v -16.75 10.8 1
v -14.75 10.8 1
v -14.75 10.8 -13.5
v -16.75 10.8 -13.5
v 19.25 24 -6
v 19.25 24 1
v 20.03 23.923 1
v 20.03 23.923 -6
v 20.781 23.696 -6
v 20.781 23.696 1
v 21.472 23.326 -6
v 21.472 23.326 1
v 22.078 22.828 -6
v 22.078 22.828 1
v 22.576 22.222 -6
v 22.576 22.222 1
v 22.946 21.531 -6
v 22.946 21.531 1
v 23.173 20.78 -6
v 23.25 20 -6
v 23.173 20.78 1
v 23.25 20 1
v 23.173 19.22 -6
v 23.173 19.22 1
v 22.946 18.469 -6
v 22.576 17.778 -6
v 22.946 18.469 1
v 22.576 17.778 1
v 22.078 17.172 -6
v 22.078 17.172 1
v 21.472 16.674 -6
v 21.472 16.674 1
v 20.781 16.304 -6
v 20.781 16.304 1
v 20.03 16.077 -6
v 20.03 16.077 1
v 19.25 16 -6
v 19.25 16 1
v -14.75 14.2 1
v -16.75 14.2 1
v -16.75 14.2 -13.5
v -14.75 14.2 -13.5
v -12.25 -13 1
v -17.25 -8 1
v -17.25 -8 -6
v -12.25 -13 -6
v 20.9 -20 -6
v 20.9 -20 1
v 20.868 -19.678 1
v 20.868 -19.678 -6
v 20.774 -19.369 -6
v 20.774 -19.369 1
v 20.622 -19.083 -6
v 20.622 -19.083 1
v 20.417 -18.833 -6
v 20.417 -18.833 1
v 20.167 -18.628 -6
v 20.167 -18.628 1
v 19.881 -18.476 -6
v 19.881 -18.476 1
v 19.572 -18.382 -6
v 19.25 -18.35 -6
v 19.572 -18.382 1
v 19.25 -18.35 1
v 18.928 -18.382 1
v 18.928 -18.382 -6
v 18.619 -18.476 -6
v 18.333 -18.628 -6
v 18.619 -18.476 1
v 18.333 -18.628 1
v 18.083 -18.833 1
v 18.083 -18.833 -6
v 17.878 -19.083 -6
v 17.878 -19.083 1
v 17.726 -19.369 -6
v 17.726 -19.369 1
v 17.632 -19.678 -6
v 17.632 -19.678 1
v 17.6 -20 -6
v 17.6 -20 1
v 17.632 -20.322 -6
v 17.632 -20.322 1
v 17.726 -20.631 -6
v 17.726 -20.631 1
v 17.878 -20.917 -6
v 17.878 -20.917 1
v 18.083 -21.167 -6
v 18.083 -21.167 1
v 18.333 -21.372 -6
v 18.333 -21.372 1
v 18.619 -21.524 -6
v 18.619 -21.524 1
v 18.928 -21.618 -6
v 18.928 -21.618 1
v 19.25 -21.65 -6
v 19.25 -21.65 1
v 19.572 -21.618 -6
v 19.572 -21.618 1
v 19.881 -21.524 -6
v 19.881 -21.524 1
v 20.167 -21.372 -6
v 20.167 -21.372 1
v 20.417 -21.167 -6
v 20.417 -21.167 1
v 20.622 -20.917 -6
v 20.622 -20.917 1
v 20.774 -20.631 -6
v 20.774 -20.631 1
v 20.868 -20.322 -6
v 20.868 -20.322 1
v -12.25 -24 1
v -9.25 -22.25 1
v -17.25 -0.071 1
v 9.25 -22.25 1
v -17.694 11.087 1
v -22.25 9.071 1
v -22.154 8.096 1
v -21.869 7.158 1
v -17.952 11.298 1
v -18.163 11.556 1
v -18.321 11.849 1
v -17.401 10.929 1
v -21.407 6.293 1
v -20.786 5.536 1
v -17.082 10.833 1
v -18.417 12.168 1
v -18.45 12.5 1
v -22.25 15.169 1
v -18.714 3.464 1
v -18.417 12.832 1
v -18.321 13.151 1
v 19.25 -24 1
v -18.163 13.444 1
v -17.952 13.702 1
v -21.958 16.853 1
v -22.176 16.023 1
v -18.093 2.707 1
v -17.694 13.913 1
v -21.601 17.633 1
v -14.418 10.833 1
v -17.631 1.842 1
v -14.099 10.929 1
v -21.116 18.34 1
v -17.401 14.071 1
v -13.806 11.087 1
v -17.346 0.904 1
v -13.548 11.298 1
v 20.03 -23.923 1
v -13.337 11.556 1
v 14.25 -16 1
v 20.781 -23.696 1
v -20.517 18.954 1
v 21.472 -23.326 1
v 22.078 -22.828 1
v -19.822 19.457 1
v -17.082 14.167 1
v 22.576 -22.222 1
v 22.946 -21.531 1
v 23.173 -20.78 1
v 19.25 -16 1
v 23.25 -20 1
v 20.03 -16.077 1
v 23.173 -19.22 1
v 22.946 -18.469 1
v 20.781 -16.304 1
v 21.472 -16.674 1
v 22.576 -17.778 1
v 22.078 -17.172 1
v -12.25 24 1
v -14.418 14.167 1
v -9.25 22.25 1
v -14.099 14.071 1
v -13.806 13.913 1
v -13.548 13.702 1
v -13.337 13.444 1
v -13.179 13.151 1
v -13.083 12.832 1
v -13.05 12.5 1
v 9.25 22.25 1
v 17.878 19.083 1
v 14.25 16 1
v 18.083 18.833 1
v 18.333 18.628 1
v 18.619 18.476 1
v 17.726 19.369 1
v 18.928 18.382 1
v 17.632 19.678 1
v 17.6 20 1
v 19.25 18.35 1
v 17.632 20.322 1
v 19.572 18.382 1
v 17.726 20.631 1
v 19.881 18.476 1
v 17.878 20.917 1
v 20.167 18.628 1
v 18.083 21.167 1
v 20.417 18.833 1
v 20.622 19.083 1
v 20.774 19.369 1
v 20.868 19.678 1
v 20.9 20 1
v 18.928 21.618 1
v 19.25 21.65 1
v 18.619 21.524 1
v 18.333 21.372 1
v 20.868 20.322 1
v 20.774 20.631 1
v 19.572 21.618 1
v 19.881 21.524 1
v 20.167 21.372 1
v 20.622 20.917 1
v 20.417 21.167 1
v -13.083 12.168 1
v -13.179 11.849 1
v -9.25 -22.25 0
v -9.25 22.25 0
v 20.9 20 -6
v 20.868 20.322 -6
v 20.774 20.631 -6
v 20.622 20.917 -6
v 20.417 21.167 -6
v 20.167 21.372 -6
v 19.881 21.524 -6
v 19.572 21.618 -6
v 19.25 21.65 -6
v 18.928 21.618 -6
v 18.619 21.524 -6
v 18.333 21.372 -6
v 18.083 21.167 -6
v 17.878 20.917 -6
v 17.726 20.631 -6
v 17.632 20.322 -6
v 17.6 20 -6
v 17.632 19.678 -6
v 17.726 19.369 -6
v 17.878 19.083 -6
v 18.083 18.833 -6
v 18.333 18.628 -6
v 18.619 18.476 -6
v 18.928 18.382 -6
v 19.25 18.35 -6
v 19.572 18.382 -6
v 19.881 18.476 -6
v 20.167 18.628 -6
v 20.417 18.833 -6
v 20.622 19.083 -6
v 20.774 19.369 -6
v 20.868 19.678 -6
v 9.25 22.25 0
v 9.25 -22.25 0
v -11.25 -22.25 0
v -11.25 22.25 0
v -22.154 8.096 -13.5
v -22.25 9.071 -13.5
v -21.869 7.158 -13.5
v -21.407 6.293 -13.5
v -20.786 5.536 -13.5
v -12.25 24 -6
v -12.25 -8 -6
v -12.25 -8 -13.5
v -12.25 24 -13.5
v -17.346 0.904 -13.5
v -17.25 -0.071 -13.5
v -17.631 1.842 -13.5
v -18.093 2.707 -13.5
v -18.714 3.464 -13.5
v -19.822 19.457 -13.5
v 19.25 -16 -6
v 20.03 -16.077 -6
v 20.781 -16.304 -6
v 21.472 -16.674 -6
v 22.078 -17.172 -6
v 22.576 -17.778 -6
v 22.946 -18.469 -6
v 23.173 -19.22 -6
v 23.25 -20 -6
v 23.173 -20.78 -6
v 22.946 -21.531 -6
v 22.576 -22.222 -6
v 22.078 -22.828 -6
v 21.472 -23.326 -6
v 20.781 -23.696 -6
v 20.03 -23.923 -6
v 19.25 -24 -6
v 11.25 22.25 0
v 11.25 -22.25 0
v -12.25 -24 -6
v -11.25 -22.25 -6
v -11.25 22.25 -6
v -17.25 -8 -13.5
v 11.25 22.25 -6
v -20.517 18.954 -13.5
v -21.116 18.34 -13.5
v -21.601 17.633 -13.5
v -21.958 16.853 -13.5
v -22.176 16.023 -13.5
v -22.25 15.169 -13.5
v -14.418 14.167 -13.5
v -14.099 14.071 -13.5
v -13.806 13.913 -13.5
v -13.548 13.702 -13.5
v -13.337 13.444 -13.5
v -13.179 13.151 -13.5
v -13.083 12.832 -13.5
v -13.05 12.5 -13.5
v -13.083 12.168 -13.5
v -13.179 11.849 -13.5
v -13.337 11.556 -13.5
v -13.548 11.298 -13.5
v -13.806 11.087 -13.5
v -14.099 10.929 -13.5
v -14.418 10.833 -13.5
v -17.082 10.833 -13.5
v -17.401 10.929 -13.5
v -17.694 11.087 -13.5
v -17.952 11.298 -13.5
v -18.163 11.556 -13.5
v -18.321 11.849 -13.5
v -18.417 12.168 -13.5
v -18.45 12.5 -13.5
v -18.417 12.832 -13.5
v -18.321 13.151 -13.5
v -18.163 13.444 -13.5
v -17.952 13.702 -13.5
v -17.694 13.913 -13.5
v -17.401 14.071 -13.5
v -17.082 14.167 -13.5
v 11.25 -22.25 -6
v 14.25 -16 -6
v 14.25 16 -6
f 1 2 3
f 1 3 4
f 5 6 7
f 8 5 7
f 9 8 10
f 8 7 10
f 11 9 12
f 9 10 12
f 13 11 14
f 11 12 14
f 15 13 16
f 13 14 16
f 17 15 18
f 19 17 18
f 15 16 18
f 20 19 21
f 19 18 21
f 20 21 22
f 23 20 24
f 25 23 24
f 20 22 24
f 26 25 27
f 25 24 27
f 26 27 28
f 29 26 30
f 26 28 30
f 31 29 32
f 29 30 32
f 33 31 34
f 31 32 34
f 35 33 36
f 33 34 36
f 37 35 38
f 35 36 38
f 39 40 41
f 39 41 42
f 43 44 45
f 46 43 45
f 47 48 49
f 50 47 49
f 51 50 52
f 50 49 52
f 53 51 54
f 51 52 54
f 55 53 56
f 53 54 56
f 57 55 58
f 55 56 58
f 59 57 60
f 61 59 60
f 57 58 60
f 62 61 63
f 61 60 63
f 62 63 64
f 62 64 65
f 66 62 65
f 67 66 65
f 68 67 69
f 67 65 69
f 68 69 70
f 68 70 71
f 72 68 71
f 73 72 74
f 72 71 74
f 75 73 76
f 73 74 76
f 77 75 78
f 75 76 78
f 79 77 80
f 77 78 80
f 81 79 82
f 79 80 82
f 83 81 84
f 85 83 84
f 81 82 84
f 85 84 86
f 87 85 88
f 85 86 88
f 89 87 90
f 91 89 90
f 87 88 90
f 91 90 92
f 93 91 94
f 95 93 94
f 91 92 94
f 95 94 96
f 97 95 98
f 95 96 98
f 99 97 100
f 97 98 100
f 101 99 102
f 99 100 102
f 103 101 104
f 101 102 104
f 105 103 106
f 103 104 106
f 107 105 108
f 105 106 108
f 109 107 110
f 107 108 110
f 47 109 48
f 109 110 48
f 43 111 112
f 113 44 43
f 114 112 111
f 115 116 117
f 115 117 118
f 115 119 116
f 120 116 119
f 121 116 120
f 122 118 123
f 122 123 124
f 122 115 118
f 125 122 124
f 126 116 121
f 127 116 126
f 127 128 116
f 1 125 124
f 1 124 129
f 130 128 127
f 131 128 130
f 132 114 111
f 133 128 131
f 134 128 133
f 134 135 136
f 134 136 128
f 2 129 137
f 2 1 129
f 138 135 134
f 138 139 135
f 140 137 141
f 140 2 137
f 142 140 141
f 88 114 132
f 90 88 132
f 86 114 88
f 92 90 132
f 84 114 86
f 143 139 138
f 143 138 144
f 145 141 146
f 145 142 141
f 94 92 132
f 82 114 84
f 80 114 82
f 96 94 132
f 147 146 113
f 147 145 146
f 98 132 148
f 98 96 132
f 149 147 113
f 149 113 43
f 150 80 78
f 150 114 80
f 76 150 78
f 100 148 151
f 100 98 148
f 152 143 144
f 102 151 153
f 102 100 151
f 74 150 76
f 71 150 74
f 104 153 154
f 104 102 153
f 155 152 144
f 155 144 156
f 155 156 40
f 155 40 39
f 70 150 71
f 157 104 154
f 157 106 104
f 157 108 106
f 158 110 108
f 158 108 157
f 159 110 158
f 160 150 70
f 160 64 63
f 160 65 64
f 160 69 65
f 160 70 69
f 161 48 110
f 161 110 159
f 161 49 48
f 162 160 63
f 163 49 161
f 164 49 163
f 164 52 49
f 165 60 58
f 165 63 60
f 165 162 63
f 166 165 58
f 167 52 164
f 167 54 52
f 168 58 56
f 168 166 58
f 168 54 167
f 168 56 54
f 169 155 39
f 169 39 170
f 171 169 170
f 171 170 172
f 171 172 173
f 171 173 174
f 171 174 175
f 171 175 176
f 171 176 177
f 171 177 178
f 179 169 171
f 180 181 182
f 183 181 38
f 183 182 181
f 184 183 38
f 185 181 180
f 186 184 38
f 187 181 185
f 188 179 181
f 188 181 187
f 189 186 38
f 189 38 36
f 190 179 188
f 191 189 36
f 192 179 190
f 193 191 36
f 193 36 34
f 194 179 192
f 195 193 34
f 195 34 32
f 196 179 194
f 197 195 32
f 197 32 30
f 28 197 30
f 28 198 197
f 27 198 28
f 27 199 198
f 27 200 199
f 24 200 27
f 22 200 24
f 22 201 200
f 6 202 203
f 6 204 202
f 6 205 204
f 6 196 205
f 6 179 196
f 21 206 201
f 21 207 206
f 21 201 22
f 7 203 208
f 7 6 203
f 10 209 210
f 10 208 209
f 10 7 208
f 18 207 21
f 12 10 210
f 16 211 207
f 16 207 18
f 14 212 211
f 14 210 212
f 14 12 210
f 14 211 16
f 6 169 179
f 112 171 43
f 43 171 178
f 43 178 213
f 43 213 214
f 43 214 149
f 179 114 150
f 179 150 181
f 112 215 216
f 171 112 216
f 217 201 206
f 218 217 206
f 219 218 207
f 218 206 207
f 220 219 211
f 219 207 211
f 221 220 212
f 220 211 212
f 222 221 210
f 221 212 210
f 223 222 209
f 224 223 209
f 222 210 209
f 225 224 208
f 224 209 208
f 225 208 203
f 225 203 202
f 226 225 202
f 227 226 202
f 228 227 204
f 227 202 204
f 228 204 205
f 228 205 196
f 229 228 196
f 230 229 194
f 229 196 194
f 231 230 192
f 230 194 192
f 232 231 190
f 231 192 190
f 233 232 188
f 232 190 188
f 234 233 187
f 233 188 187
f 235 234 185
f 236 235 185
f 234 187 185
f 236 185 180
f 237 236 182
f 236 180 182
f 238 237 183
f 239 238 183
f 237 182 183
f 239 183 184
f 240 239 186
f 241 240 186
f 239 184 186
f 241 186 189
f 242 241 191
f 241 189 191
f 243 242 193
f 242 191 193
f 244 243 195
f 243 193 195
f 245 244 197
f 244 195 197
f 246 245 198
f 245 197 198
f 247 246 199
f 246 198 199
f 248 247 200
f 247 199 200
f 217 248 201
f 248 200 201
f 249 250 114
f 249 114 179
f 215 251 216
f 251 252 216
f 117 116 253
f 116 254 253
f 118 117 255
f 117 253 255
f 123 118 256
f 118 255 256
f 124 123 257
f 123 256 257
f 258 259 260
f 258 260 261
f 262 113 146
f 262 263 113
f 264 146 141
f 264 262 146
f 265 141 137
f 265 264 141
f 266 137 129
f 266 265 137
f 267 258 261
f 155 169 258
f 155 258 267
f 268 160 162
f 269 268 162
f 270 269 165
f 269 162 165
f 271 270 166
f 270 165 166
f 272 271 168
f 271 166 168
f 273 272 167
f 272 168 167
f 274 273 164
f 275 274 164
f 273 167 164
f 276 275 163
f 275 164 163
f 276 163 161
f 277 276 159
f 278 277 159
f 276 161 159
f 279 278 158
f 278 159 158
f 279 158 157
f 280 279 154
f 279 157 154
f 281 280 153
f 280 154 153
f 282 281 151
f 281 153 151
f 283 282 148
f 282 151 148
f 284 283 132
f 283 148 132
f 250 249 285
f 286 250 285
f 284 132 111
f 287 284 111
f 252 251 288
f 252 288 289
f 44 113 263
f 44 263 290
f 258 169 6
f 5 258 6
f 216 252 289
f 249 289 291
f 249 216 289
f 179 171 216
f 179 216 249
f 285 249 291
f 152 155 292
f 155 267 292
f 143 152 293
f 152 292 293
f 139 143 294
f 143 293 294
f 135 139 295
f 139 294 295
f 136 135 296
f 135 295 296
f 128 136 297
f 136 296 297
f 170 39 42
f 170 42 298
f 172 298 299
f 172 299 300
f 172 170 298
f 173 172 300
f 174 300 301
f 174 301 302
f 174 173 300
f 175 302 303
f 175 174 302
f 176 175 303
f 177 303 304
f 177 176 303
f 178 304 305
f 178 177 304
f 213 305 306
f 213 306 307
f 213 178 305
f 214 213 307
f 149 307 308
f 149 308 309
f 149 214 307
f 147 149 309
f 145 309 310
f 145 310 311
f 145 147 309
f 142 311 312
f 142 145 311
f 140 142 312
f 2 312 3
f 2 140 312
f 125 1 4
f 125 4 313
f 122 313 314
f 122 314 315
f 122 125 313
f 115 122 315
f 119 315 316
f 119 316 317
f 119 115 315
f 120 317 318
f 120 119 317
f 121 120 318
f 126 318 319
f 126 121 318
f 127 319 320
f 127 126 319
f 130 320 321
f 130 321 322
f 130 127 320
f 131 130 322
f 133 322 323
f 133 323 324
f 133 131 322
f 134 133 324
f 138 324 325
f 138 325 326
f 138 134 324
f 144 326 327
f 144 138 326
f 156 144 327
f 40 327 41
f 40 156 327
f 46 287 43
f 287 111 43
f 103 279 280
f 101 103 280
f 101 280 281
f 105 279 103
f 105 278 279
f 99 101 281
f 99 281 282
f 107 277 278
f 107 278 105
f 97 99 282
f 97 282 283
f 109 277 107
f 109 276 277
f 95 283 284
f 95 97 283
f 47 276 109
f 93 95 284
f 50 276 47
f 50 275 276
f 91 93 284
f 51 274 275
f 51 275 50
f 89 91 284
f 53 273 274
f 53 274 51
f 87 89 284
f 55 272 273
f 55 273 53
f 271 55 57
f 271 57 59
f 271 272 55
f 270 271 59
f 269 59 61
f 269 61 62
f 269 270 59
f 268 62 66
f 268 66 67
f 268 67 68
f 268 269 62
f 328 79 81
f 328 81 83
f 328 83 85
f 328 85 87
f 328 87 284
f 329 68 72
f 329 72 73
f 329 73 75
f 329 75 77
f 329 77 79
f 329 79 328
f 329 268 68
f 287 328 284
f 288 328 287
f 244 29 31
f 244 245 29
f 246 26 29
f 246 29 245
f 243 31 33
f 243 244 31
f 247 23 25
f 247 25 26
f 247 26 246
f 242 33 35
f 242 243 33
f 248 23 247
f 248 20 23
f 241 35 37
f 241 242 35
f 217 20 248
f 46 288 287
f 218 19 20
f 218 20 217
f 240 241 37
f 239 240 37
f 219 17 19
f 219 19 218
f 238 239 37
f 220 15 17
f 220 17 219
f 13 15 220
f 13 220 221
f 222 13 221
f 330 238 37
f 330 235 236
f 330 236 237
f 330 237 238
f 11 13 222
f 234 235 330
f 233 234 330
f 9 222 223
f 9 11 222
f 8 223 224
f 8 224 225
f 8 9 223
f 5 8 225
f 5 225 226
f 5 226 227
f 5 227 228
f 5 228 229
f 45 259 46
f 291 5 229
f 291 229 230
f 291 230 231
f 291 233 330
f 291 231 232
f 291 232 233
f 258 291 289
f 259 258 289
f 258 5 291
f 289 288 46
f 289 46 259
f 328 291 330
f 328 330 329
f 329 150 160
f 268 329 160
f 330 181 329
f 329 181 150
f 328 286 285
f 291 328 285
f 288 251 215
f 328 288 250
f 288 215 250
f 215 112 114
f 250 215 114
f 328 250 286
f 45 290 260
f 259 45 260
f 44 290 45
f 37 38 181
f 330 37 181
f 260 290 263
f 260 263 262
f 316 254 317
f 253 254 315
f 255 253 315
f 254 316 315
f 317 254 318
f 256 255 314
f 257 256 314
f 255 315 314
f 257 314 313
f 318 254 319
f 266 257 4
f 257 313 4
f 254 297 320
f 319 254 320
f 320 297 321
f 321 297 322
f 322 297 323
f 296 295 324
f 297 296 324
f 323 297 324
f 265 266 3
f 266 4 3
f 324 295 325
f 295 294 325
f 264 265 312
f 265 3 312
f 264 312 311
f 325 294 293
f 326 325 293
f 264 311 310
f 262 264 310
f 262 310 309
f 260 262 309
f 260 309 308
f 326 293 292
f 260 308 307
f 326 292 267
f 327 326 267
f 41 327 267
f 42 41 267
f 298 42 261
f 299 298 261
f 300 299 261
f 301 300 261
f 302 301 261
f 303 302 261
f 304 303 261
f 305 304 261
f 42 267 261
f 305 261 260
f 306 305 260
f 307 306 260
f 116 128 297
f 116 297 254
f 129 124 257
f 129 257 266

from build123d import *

# Parameters (mm, degrees)
ESBO_O1_W                = 24.5
ESBO_O1_H                = 48
ESBO_O1_W_2              = 18.5
ESBO_O1_H_2              = 44.5
RESSALTO_EXTRUS_O1_DEPTH = 1
ESBO_O2_R                = 1.65
ESBO_O2_W                = 22.5
ESBO_O2_H                = 44.5
RESSALTO_EXTRUS_O2_DEPTH = 7
RESSALTO_EXTRUS_O3_DEPTH = 14.5
FILETE1_R                = 5
CHANFRO4_SIZE            = 5


with BuildPart() as part:
    # Esboço1 → Ressalto-extrusão1 (new body)
    with BuildSketch(Plane.XY):
        Rectangle(ESBO_O1_W, ESBO_O1_H)
        Rectangle(ESBO_O1_W_2, ESBO_O1_H_2, mode=Mode.SUBTRACT)
    extrude(amount=RESSALTO_EXTRUS_O1_DEPTH)

    # Esboço2 → Ressalto-extrusão2 (add)
    with BuildSketch(Plane.XY.offset(1)):
        with BuildLine():
            Line((19.25, 16), (14.25, 16))
            Line((14.25, 16), (14.25, -16))
            Line((14.25, -16), (19.25, -16))
            ThreePointArc((19.25, -16), (23.25, -20), (19.25, -24))
            Line((19.25, -24), (12.25, -24))
            Line((12.25, -24), (-12.25, -24))
            Line((-12.25, -24), (-12.25, 24))
            Line((-12.25, 24), (12.25, 24))
            Line((12.25, 24), (19.25, 24))
            ThreePointArc((19.25, 24), (23.25, 20), (19.25, 16))
        make_face()
        with Locations((19.25, 20)):
            Circle(ESBO_O2_R, mode=Mode.SUBTRACT)
        with Locations((19.25, -20)):
            Circle(ESBO_O2_R, mode=Mode.SUBTRACT)
        Rectangle(ESBO_O2_W, ESBO_O2_H, mode=Mode.SUBTRACT)
    extrude(amount=-RESSALTO_EXTRUS_O2_DEPTH)

    # Esboço4 → Ressalto-extrusão3 (add)
    with BuildSketch(Plane.XY.offset(1)):
        Polygon((-12.25, -8), (-12.25, 24), (-22.25, 18), (-22.25, 7), (-17.25, 2), (-17.25, -8), align=None)
        with BuildLine():
            ThreePointArc((-16.75, 10.8), (-18.45, 12.5), (-16.75, 14.2))
            Line((-16.75, 14.2), (-14.75, 14.2))
            ThreePointArc((-14.75, 14.2), (-13.05, 12.5), (-14.75, 10.8))
            Line((-14.75, 10.8), (-16.75, 10.8))
        make_face(mode=Mode.SUBTRACT)
    extrude(amount=-RESSALTO_EXTRUS_O3_DEPTH)

    # Filete1
    filete1_edges = [part.edges().sort_by_distance(p)[0] for p in [
        (-17.25, 2, -6.25),
        (-22.25, 7, -6.25),
        (-22.25, 18, -6.25),
    ]]
    fillet(filete1_edges, radius=FILETE1_R)

    # Chanfro4
    chanfro4_edges = [part.edges().sort_by_distance(p)[0] for p in [
        (-12.25, -8, -2.5),
    ]]
    chamfer(chanfro4_edges, length=CHANFRO4_SIZE - 0.0001)  # a hair under: the kernel refuses the full size


solid = part.part
